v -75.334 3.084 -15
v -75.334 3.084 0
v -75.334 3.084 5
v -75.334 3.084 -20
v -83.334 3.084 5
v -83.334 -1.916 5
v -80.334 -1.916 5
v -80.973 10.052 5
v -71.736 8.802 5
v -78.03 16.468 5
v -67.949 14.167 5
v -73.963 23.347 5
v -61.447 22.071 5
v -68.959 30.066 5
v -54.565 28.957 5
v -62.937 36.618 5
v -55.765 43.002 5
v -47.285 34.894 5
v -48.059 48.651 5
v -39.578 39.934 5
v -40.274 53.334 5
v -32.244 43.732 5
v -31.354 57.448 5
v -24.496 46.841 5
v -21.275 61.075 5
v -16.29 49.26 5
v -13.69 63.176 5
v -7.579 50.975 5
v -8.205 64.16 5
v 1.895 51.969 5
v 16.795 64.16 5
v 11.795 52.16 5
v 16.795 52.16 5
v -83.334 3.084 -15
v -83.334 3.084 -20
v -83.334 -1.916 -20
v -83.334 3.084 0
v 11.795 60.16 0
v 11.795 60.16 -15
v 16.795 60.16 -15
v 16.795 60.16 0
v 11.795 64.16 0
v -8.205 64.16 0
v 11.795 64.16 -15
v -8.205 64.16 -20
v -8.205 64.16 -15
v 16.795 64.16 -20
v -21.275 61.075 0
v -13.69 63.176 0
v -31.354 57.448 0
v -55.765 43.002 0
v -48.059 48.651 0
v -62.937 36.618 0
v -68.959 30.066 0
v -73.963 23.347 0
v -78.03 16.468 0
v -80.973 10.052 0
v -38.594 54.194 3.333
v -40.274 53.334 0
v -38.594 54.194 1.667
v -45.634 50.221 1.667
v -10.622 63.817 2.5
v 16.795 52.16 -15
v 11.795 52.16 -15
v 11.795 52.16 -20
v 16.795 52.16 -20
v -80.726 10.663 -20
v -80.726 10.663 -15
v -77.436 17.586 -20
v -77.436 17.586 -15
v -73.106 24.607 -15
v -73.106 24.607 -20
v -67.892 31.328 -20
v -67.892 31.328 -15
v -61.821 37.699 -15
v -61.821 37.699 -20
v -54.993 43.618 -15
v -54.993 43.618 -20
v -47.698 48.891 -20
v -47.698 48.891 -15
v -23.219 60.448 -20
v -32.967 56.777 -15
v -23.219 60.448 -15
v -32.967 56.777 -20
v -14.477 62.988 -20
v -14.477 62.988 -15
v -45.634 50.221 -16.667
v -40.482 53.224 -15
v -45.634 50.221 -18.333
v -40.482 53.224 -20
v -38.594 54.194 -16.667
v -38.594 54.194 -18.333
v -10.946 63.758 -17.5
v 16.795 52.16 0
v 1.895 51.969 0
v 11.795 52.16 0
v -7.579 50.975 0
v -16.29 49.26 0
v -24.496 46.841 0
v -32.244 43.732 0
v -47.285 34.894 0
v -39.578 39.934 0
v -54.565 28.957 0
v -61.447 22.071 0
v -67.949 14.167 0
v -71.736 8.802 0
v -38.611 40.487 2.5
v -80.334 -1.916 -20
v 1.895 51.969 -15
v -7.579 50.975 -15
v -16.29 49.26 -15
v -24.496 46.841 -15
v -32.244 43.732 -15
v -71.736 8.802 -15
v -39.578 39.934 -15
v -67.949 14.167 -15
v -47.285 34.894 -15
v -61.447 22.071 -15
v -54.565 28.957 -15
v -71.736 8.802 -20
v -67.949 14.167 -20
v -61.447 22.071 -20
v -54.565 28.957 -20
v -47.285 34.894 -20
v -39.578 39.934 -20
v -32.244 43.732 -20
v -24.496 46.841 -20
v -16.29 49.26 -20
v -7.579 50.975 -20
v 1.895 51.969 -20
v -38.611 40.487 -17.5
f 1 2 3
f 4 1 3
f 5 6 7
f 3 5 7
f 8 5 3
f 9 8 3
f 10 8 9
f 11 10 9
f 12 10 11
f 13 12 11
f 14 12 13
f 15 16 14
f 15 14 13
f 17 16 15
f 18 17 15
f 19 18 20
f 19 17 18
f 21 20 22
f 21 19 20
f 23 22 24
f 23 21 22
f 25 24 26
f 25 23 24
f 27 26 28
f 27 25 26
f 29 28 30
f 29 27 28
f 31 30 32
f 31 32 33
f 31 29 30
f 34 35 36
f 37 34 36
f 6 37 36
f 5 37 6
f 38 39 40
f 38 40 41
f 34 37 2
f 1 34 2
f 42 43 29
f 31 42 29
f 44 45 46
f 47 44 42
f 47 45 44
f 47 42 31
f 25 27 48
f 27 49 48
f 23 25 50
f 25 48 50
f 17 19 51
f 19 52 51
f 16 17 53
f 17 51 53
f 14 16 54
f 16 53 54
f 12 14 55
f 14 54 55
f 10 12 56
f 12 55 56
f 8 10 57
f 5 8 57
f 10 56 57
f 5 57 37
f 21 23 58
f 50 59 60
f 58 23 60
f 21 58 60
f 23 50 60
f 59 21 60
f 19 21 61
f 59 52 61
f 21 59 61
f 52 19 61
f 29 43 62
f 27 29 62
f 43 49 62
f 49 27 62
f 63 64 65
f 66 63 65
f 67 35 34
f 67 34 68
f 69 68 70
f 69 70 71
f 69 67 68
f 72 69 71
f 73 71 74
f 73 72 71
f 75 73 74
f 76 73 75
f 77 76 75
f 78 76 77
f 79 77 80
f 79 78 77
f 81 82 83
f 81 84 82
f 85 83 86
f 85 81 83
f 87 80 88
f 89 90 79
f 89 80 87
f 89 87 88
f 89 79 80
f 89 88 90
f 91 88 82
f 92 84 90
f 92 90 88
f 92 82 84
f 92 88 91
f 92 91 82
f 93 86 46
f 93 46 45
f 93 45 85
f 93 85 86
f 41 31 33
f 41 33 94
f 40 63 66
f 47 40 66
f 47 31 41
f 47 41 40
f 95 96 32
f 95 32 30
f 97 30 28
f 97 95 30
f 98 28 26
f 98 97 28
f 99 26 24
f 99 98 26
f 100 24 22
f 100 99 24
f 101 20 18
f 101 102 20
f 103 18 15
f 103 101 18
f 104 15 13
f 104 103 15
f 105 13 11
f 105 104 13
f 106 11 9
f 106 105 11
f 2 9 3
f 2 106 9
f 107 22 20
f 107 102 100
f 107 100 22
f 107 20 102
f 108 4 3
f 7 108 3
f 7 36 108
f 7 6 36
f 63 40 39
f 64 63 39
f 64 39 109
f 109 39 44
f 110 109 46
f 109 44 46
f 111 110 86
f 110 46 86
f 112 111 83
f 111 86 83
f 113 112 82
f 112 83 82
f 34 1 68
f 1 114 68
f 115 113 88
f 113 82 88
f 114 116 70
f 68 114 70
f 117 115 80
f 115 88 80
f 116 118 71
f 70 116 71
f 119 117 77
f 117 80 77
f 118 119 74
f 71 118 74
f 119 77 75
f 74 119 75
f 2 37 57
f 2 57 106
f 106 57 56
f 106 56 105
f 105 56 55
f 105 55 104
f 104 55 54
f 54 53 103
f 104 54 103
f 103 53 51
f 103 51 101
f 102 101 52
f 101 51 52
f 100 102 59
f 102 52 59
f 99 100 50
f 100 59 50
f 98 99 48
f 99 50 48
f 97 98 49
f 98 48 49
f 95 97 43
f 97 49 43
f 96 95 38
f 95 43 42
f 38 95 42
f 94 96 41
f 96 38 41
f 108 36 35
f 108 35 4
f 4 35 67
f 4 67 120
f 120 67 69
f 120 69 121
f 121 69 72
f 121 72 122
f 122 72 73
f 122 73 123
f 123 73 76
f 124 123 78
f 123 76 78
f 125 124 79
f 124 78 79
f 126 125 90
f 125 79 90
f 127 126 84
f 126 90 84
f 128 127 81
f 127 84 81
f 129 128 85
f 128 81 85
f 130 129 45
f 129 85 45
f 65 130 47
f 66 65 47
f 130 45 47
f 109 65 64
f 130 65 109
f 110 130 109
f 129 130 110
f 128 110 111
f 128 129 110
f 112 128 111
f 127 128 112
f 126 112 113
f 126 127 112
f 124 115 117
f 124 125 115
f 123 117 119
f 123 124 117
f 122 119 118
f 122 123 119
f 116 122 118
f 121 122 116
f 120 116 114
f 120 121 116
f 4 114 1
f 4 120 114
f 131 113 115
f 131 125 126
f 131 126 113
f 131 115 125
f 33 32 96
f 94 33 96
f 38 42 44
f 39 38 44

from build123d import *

# Parameters (mm, degrees)
Y_KSEKLIK_EKSTR_ZYON1_DEPTH = 5
IZIM2_W                     = 25
IZIM2_H                     = 12
Y_KSEKLIK_EKSTR_ZYON2_DEPTH = 5
Y_KSEKLIK_EKSTR_ZYON3_DEPTH = 5
IZIM4_W                     = 8.00000005
IZIM4_H                     = 25
Y_KSEKLIK_EKSTR_ZYON4_DEPTH = 5
PAH1_SIZE                   = 5
KES_EKSTR_ZYON1_REACH       = 118.474
IZIM5_W                     = 15
IZIM5_H                     = 11.42641292


with BuildPart() as part:
    # Çizim1 → Yükseklik-Ekstrüzyon1 (new body)
    with BuildSketch(Plane.XY):
        with BuildLine():
            Line((11.795489464, 52.159673173), (11.795489464, 59.159673173))
            Line((11.795489464, 59.159673173), (11.795489464, 64.159673173))
            Line((11.795489464, 64.159673173), (-8.204510536, 64.159673173))
            add(Edge.make_bspline(
                [(-8.204510536, 64.159673173), (-13.650800552, 63.66245189), (-29.933617008, 59.069334228), (-50.967122345, 47.507508093), (-76.199679343, 28.532057851), (-83.334078998, 3.083830852)],
                knots=[0.168211621, 0.168211621, 0.168211621, 0.168211621, 0.59733857, 0.680517408, 1, 1, 1, 1], degree=3))
            Line((-83.334078998, 3.083830852), (-75.334078998, 3.083830852))
            add(Edge.make_bspline(
                [(11.795489464, 52.159673173), (-45.452144083, 53.352401488), (-75.334078998, 3.083830852)],
                knots=[0, 0, 0, 1, 1, 1], degree=2))
        make_face()
    extrude(amount=Y_KSEKLIK_EKSTR_ZYON1_DEPTH)

    # Çizim2 → Yükseklik-Ekstrüzyon2 (add)
    with BuildSketch(Plane(origin=(11.795489464, 0, 0), x_dir=(0, 0, -1), z_dir=(1, 0, 0))):
        with Locations((7.5, 58.159673173)):
            Rectangle(IZIM2_W, IZIM2_H)
    extrude(amount=Y_KSEKLIK_EKSTR_ZYON2_DEPTH)

    # Çizim3 → Yükseklik-Ekstrüzyon3 (add)
    with BuildSketch(Plane(origin=(0, 0, -20), x_dir=(-1, 0, 0), z_dir=(0, 0, -1))):
        with BuildLine():
            Line((75.334078948, 3.083830937), (83.334078998, 3.083830852))
            add(Edge.make_bspline(
                [(83.334078998, 3.083830852), (76.199679343, 28.532057851), (50.967122345, 47.507508093), (29.933617008, 59.069334228), (13.650800552, 63.66245189), (8.204510536, 64.159673173)],
                knots=[0.168211621, 0.168211621, 0.168211621, 0.168211621, 0.487694213, 0.570873051, 1, 1, 1, 1], degree=3))
            Line((8.204510536, 64.159673173), (-11.795489464, 64.159673173))
            Line((-11.795489464, 64.159673173), (-11.795489464, 52.159673173))
            add(Edge.make_bspline(
                [(-11.795489464, 52.159673173), (45.452144035, 53.352401487), (75.334078948, 3.083830937)],
                knots=[0, 0, 0, 1, 1, 1], degree=2))
        make_face()
    extrude(amount=-Y_KSEKLIK_EKSTR_ZYON3_DEPTH)

    # Çizim4 → Yükseklik-Ekstrüzyon4 (add)
    with BuildSketch(Plane(origin=(-3.3e-08, 3.08383174, 0), x_dir=(1.0, 1.0658518704879855e-08, 0), z_dir=(1.0658518704879855e-08, -1.0, 0))):
        with Locations((-79.33407894, -7.5)):
            Rectangle(IZIM4_W, IZIM4_H)
    extrude(amount=Y_KSEKLIK_EKSTR_ZYON4_DEPTH)

    # Pah1
    pah1_edges = [part.edges().sort_by_distance(p)[0] for p in [
        (-75.334078894, -1.916169063, -7.5),
    ]]
    chamfer(pah1_edges, length=PAH1_SIZE - 0.0001)  # a hair under: the kernel refuses the full size

    # Çizim5 → Kes-Ekstrüzyon1 (cut, up to next)
    with BuildSketch(Plane.ZY.offset(-11.795489464), mode=Mode.PRIVATE) as kes_ekstr_zyon1_sk1:
        with Locations((-7.5, 54.446466713)):
            Rectangle(IZIM5_W, IZIM5_H)
    kes_ekstr_zyon1_tool1 = extrude(kes_ekstr_zyon1_sk1.sketch, amount=-KES_EKSTR_ZYON1_REACH, mode=Mode.PRIVATE) & part.part
    add(kes_ekstr_zyon1_tool1.solids().sort_by_distance((11.795489, 54.446467, -7.5))[0], mode=Mode.SUBTRACT)


solid = part.part
